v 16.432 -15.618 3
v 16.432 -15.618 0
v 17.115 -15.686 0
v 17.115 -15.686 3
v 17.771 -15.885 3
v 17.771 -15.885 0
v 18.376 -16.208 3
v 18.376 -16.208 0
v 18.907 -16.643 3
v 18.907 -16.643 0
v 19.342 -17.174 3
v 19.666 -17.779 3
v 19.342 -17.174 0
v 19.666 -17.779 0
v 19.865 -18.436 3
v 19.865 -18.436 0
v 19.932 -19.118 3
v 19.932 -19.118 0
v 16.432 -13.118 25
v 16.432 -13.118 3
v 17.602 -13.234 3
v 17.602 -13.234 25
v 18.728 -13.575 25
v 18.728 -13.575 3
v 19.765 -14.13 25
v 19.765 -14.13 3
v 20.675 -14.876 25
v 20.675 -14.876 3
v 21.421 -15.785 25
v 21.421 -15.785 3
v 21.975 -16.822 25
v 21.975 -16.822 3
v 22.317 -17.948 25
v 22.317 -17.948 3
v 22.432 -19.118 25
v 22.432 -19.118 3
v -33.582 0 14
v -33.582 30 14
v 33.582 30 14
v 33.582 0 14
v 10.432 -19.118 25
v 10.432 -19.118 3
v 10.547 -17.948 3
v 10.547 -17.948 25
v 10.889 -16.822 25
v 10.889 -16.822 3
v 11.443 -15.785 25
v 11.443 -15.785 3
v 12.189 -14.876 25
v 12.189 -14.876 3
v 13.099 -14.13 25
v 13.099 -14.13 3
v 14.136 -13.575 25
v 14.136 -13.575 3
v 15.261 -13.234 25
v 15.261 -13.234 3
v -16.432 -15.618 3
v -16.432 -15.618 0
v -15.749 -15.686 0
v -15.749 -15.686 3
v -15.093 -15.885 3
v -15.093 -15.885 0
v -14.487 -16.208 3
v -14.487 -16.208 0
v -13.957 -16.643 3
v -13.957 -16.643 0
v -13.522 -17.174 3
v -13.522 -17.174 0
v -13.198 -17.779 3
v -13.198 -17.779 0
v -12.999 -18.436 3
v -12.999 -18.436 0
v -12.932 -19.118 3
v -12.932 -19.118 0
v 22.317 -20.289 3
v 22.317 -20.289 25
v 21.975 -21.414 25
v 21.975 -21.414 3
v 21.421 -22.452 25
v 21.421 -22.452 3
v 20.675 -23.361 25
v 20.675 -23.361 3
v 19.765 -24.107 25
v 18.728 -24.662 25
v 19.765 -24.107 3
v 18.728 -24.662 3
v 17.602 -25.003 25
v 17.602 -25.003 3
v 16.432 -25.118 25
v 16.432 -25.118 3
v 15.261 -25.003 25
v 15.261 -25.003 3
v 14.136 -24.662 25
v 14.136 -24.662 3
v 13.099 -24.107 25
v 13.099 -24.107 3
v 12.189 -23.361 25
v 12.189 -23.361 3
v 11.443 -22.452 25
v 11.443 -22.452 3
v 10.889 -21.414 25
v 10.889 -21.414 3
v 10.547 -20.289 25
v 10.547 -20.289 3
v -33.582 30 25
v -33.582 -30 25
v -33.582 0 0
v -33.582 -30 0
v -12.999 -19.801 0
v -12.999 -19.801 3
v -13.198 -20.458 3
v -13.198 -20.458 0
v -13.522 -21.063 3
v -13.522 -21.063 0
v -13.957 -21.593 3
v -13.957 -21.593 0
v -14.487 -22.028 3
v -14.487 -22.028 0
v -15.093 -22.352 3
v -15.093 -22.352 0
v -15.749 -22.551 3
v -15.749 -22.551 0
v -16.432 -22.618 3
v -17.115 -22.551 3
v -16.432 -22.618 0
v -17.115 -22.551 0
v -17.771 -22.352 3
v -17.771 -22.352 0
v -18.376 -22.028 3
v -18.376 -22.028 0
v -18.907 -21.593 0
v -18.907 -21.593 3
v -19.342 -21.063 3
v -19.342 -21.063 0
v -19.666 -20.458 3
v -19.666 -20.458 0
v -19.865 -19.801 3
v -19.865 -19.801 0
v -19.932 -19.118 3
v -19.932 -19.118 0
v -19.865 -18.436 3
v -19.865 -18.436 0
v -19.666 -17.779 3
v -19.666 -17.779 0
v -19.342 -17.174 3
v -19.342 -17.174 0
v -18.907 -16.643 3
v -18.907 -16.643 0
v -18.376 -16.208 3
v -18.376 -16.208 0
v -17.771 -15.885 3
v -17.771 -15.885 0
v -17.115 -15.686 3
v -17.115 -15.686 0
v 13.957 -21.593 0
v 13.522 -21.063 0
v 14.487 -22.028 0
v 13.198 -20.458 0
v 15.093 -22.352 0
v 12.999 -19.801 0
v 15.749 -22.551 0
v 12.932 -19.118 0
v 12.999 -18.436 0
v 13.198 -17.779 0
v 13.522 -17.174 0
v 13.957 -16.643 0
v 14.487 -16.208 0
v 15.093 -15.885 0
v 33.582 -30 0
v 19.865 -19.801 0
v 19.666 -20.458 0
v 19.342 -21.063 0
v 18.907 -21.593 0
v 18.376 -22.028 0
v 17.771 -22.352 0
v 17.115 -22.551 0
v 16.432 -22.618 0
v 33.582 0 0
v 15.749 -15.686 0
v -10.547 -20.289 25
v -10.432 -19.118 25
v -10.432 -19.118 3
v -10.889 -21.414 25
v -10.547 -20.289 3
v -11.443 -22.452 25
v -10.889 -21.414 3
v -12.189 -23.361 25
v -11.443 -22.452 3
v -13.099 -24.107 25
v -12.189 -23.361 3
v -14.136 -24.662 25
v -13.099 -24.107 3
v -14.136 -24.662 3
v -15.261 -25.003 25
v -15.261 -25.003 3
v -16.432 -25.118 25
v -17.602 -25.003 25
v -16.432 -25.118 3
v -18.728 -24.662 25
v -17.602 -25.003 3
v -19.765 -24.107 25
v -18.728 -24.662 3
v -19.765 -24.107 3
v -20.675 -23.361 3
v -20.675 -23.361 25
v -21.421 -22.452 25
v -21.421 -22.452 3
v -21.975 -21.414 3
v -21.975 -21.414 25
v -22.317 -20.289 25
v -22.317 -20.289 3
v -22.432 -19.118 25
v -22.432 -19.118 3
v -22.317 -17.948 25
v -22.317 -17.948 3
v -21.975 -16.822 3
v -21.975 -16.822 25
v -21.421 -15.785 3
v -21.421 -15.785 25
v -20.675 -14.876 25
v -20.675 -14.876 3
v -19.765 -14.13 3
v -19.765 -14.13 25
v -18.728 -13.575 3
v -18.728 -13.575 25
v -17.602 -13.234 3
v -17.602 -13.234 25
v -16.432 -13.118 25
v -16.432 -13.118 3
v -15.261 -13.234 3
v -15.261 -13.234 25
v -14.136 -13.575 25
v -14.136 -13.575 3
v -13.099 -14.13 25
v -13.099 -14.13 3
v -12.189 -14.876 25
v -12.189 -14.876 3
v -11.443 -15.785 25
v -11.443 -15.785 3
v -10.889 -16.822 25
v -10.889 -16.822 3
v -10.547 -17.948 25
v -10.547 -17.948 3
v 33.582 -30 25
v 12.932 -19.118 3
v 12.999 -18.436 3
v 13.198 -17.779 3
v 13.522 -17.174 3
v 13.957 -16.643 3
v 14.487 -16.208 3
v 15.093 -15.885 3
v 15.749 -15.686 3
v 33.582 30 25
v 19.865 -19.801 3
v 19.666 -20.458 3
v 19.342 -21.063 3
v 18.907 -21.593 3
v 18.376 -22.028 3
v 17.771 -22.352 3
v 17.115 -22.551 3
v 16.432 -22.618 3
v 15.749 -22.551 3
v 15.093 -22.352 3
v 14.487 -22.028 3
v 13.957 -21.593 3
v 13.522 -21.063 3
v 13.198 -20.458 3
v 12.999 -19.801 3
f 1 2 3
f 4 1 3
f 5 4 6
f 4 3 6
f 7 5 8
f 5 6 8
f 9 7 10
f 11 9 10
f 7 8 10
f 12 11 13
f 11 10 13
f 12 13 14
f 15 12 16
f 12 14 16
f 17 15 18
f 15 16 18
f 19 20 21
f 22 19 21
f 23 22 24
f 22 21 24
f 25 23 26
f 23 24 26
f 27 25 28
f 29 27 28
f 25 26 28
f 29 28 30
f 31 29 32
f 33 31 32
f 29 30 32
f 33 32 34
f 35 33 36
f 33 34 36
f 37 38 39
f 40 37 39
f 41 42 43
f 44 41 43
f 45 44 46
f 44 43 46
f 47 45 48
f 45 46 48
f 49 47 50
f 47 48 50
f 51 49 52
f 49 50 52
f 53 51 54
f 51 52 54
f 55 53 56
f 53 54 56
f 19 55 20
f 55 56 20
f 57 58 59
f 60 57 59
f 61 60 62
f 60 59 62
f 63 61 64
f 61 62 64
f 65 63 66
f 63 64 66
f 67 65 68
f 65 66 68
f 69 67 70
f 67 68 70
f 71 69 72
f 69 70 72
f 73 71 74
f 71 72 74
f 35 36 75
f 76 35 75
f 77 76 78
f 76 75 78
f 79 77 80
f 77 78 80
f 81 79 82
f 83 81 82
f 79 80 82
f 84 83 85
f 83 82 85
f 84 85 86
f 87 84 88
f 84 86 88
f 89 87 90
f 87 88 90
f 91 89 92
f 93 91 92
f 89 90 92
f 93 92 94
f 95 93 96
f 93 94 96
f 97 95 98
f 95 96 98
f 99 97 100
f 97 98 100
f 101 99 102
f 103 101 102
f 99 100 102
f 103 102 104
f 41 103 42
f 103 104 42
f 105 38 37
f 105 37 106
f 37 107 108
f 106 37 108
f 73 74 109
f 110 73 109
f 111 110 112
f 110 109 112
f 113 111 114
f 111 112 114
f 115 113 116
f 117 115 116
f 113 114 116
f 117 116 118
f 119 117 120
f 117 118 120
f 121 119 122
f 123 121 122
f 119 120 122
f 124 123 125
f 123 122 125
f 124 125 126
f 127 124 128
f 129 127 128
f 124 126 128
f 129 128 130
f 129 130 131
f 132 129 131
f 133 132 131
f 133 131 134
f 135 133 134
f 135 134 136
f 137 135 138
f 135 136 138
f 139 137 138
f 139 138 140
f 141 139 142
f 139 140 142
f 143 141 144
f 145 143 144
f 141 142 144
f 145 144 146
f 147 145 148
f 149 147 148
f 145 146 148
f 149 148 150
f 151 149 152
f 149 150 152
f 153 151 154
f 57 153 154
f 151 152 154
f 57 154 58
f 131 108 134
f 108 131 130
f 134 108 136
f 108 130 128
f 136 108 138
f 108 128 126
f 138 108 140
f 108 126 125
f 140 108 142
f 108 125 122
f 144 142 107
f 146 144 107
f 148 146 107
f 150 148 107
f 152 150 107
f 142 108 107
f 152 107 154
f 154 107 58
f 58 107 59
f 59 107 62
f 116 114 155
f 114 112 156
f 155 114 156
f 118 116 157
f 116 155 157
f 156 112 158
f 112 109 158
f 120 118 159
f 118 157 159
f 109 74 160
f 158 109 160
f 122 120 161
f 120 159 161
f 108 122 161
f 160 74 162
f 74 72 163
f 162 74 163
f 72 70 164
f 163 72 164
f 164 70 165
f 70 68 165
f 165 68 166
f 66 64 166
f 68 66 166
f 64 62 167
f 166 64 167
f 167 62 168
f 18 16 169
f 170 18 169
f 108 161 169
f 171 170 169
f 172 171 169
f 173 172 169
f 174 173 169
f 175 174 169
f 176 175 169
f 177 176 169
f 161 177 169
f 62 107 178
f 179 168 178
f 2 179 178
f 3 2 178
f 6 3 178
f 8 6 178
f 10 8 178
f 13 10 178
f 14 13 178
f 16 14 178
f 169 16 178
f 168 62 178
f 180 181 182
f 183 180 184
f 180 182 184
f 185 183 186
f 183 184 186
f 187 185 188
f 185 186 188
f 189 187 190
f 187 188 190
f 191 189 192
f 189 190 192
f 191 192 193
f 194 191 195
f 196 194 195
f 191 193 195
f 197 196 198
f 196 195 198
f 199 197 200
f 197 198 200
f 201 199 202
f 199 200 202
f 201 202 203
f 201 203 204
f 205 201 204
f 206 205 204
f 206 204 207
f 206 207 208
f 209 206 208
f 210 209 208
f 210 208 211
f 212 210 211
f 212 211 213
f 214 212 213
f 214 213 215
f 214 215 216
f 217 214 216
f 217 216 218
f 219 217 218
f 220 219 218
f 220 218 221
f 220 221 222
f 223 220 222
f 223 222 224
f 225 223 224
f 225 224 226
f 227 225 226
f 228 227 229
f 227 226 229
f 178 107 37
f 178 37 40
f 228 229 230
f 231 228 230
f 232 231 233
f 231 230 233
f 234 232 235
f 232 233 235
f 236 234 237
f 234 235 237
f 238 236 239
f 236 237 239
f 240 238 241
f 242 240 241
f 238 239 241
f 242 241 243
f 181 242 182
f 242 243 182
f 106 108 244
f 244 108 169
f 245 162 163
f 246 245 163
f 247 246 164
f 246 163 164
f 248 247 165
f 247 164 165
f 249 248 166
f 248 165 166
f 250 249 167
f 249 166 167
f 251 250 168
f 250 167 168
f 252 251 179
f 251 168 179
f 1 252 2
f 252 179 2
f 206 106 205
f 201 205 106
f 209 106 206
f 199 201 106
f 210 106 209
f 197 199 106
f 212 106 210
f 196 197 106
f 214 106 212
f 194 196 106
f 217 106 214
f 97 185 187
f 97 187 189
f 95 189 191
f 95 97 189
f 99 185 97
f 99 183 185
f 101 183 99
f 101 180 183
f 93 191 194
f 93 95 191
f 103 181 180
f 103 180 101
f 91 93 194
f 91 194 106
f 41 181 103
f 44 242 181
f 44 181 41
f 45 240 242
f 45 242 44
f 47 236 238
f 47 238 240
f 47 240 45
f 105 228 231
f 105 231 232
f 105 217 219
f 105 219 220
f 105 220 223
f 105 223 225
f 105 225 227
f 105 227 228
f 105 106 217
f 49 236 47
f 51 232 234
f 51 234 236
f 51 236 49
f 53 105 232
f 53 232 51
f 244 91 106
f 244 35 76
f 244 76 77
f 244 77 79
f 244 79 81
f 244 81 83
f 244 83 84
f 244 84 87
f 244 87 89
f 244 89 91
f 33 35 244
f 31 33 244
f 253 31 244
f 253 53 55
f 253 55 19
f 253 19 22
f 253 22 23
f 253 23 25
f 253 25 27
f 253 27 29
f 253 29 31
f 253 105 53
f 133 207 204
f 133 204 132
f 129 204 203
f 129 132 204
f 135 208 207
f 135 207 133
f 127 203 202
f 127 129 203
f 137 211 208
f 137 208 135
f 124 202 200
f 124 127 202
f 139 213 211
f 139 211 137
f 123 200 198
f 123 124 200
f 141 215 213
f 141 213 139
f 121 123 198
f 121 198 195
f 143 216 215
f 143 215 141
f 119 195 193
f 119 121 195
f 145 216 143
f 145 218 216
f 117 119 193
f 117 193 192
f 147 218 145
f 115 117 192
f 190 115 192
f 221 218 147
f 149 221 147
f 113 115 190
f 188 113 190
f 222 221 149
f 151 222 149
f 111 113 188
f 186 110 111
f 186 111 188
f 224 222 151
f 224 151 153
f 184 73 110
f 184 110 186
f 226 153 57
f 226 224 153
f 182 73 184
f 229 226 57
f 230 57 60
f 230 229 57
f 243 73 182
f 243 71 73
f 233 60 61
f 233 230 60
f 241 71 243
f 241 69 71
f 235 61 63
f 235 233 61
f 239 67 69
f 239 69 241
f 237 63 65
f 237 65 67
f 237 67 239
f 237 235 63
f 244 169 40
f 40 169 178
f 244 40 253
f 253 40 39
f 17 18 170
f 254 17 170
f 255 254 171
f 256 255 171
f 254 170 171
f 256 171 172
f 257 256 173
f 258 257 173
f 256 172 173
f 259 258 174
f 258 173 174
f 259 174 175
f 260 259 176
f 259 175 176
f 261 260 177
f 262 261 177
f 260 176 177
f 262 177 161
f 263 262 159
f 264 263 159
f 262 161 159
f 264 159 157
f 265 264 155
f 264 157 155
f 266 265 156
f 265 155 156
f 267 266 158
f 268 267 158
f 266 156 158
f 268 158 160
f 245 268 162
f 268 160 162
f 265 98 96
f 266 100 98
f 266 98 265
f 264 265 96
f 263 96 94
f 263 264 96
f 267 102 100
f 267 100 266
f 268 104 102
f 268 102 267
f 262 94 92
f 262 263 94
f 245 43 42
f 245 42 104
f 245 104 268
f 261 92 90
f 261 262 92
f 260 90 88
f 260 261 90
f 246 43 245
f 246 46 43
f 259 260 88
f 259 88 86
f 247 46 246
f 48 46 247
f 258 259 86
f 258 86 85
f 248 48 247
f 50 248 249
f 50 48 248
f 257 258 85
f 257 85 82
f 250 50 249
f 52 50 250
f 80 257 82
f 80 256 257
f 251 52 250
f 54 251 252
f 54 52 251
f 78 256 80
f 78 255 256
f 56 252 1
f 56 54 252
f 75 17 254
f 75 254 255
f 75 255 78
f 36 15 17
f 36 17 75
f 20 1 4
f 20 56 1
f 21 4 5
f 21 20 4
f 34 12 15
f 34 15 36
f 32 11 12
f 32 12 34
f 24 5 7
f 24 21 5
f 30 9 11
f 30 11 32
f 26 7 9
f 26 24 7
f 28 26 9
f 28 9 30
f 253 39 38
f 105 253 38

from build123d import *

# Parameters (mm, degrees)
F0_W     = 32.8638516366
F0_H     = 19.1183499992
F1_DEPTH = 25
F2_DEPTH = 3
F3_DEPTH = 14


with BuildPart() as f1:
    # F0 (on Top) → F1 (new body)
    with BuildSketch(Plane.XY):
        Polygon((33.5817799435, 0), (33.5817799435, 30), (-33.5817799435, 30), (-33.5817799435, 0), (-16.4319258183, 0), (-16.4319258183, 19.1183499992), (16.4319258183, 19.1183499992), (16.4319258183, 0), align=None)
        with Locations((0, 9.5591749996)):
            Rectangle(F0_W, F0_H)
        with BuildLine():
            Line((16.4319258183, -13.1183499992), (16.4319258183, 0))
            Line((16.4319258183, 0), (-16.4319258183, 0))
            Line((-16.4319258183, 0), (-16.4319258183, -13.1183499992))
            ThreePointArc((-16.4319258183, -13.1183499992), (-12.1892851312, -14.8757093121), (-10.4319258183, -19.1183499992))
            Line((-10.4319258183, -19.1183499992), (10.4319258183, -19.1183499992))
            ThreePointArc((10.4319258183, -19.1183499992), (12.1892851312, -14.8757093121), (16.4319258183, -13.1183499992))
        make_face()
        with BuildLine():
            Line((33.5817799435, -30), (33.5817799435, 0))
            Line((33.5817799435, 0), (16.4319258183, 0))
            Line((16.4319258183, 0), (16.4319258183, -13.1183499992))
            ThreePointArc((16.4319258183, -13.1183499992), (20.6745665054, -14.8757093121), (22.4319258183, -19.1183499992))
            ThreePointArc((22.4319258183, -19.1183499992), (16.4319258183, -25.1183499992), (10.4319258183, -19.1183499992))
            Line((10.4319258183, -19.1183499992), (-10.4319258183, -19.1183499992))
            ThreePointArc((-10.4319258183, -19.1183499992), (-20.6745665054, -23.3609906863), (-16.4319258183, -13.1183499992))
            Line((-16.4319258183, -13.1183499992), (-16.4319258183, 0))
            Line((-16.4319258183, 0), (-33.5817799435, 0))
            Line((-33.5817799435, 0), (-33.5817799435, -30))
            Line((-33.5817799435, -30), (33.5817799435, -30))
        make_face()
    extrude(amount=F1_DEPTH)

    # F0 (on Top) → F2 (join)
    with BuildSketch(Plane.XY):
        with BuildLine():
            Line((-16.4319258183, -15.6183499992), (-16.4319258183, -13.1183499992))
            ThreePointArc((-16.4319258183, -13.1183499992), (-20.6745665054, -23.3609906863), (-10.4319258183, -19.1183499992))
            Line((-10.4319258183, -19.1183499992), (-12.9319258183, -19.1183499992))
            ThreePointArc((-12.9319258183, -19.1183499992), (-18.9067995525, -21.5932237333), (-16.4319258183, -15.6183499992))
        make_face()
        with BuildLine():
            ThreePointArc((-10.4319258183, -19.1183499992), (-12.1892851312, -14.8757093121), (-16.4319258183, -13.1183499992))
            Line((-16.4319258183, -13.1183499992), (-16.4319258183, -15.6183499992))
            ThreePointArc((-16.4319258183, -15.6183499992), (-13.9570520842, -16.643476265), (-12.9319258183, -19.1183499992))
            Line((-12.9319258183, -19.1183499992), (-10.4319258183, -19.1183499992))
        make_face()
        with BuildLine():
            Line((16.4319258183, -15.6183499992), (16.4319258183, -13.1183499992))
            ThreePointArc((16.4319258183, -13.1183499992), (12.1892851312, -14.8757093121), (10.4319258183, -19.1183499992))
            Line((10.4319258183, -19.1183499992), (12.9319258183, -19.1183499992))
            ThreePointArc((12.9319258183, -19.1183499992), (13.9570520842, -16.643476265), (16.4319258183, -15.6183499992))
        make_face()
        with BuildLine():
            ThreePointArc((22.4319258183, -19.1183499992), (20.6745665054, -14.8757093121), (16.4319258183, -13.1183499992))
            Line((16.4319258183, -13.1183499992), (16.4319258183, -15.6183499992))
            ThreePointArc((16.4319258183, -15.6183499992), (18.9067995525, -16.643476265), (19.9319258183, -19.1183499992))
            ThreePointArc((19.9319258183, -19.1183499992), (16.4319258183, -22.6183499992), (12.9319258183, -19.1183499992))
            Line((12.9319258183, -19.1183499992), (10.4319258183, -19.1183499992))
            ThreePointArc((10.4319258183, -19.1183499992), (16.4319258183, -25.1183499992), (22.4319258183, -19.1183499992))
        make_face()
    extrude(amount=F2_DEPTH)

    # F0 (on Top) → F3 (cut)
    with BuildSketch(Plane.XY):
        Polygon((33.5817799435, 0), (33.5817799435, 30), (-33.5817799435, 30), (-33.5817799435, 0), (-16.4319258183, 0), (-16.4319258183, 19.1183499992), (16.4319258183, 19.1183499992), (16.4319258183, 0), align=None)
        with Locations((0, 9.5591749996)):
            Rectangle(F0_W, F0_H)
    extrude(amount=F3_DEPTH, mode=Mode.SUBTRACT)


solid = f1.part
